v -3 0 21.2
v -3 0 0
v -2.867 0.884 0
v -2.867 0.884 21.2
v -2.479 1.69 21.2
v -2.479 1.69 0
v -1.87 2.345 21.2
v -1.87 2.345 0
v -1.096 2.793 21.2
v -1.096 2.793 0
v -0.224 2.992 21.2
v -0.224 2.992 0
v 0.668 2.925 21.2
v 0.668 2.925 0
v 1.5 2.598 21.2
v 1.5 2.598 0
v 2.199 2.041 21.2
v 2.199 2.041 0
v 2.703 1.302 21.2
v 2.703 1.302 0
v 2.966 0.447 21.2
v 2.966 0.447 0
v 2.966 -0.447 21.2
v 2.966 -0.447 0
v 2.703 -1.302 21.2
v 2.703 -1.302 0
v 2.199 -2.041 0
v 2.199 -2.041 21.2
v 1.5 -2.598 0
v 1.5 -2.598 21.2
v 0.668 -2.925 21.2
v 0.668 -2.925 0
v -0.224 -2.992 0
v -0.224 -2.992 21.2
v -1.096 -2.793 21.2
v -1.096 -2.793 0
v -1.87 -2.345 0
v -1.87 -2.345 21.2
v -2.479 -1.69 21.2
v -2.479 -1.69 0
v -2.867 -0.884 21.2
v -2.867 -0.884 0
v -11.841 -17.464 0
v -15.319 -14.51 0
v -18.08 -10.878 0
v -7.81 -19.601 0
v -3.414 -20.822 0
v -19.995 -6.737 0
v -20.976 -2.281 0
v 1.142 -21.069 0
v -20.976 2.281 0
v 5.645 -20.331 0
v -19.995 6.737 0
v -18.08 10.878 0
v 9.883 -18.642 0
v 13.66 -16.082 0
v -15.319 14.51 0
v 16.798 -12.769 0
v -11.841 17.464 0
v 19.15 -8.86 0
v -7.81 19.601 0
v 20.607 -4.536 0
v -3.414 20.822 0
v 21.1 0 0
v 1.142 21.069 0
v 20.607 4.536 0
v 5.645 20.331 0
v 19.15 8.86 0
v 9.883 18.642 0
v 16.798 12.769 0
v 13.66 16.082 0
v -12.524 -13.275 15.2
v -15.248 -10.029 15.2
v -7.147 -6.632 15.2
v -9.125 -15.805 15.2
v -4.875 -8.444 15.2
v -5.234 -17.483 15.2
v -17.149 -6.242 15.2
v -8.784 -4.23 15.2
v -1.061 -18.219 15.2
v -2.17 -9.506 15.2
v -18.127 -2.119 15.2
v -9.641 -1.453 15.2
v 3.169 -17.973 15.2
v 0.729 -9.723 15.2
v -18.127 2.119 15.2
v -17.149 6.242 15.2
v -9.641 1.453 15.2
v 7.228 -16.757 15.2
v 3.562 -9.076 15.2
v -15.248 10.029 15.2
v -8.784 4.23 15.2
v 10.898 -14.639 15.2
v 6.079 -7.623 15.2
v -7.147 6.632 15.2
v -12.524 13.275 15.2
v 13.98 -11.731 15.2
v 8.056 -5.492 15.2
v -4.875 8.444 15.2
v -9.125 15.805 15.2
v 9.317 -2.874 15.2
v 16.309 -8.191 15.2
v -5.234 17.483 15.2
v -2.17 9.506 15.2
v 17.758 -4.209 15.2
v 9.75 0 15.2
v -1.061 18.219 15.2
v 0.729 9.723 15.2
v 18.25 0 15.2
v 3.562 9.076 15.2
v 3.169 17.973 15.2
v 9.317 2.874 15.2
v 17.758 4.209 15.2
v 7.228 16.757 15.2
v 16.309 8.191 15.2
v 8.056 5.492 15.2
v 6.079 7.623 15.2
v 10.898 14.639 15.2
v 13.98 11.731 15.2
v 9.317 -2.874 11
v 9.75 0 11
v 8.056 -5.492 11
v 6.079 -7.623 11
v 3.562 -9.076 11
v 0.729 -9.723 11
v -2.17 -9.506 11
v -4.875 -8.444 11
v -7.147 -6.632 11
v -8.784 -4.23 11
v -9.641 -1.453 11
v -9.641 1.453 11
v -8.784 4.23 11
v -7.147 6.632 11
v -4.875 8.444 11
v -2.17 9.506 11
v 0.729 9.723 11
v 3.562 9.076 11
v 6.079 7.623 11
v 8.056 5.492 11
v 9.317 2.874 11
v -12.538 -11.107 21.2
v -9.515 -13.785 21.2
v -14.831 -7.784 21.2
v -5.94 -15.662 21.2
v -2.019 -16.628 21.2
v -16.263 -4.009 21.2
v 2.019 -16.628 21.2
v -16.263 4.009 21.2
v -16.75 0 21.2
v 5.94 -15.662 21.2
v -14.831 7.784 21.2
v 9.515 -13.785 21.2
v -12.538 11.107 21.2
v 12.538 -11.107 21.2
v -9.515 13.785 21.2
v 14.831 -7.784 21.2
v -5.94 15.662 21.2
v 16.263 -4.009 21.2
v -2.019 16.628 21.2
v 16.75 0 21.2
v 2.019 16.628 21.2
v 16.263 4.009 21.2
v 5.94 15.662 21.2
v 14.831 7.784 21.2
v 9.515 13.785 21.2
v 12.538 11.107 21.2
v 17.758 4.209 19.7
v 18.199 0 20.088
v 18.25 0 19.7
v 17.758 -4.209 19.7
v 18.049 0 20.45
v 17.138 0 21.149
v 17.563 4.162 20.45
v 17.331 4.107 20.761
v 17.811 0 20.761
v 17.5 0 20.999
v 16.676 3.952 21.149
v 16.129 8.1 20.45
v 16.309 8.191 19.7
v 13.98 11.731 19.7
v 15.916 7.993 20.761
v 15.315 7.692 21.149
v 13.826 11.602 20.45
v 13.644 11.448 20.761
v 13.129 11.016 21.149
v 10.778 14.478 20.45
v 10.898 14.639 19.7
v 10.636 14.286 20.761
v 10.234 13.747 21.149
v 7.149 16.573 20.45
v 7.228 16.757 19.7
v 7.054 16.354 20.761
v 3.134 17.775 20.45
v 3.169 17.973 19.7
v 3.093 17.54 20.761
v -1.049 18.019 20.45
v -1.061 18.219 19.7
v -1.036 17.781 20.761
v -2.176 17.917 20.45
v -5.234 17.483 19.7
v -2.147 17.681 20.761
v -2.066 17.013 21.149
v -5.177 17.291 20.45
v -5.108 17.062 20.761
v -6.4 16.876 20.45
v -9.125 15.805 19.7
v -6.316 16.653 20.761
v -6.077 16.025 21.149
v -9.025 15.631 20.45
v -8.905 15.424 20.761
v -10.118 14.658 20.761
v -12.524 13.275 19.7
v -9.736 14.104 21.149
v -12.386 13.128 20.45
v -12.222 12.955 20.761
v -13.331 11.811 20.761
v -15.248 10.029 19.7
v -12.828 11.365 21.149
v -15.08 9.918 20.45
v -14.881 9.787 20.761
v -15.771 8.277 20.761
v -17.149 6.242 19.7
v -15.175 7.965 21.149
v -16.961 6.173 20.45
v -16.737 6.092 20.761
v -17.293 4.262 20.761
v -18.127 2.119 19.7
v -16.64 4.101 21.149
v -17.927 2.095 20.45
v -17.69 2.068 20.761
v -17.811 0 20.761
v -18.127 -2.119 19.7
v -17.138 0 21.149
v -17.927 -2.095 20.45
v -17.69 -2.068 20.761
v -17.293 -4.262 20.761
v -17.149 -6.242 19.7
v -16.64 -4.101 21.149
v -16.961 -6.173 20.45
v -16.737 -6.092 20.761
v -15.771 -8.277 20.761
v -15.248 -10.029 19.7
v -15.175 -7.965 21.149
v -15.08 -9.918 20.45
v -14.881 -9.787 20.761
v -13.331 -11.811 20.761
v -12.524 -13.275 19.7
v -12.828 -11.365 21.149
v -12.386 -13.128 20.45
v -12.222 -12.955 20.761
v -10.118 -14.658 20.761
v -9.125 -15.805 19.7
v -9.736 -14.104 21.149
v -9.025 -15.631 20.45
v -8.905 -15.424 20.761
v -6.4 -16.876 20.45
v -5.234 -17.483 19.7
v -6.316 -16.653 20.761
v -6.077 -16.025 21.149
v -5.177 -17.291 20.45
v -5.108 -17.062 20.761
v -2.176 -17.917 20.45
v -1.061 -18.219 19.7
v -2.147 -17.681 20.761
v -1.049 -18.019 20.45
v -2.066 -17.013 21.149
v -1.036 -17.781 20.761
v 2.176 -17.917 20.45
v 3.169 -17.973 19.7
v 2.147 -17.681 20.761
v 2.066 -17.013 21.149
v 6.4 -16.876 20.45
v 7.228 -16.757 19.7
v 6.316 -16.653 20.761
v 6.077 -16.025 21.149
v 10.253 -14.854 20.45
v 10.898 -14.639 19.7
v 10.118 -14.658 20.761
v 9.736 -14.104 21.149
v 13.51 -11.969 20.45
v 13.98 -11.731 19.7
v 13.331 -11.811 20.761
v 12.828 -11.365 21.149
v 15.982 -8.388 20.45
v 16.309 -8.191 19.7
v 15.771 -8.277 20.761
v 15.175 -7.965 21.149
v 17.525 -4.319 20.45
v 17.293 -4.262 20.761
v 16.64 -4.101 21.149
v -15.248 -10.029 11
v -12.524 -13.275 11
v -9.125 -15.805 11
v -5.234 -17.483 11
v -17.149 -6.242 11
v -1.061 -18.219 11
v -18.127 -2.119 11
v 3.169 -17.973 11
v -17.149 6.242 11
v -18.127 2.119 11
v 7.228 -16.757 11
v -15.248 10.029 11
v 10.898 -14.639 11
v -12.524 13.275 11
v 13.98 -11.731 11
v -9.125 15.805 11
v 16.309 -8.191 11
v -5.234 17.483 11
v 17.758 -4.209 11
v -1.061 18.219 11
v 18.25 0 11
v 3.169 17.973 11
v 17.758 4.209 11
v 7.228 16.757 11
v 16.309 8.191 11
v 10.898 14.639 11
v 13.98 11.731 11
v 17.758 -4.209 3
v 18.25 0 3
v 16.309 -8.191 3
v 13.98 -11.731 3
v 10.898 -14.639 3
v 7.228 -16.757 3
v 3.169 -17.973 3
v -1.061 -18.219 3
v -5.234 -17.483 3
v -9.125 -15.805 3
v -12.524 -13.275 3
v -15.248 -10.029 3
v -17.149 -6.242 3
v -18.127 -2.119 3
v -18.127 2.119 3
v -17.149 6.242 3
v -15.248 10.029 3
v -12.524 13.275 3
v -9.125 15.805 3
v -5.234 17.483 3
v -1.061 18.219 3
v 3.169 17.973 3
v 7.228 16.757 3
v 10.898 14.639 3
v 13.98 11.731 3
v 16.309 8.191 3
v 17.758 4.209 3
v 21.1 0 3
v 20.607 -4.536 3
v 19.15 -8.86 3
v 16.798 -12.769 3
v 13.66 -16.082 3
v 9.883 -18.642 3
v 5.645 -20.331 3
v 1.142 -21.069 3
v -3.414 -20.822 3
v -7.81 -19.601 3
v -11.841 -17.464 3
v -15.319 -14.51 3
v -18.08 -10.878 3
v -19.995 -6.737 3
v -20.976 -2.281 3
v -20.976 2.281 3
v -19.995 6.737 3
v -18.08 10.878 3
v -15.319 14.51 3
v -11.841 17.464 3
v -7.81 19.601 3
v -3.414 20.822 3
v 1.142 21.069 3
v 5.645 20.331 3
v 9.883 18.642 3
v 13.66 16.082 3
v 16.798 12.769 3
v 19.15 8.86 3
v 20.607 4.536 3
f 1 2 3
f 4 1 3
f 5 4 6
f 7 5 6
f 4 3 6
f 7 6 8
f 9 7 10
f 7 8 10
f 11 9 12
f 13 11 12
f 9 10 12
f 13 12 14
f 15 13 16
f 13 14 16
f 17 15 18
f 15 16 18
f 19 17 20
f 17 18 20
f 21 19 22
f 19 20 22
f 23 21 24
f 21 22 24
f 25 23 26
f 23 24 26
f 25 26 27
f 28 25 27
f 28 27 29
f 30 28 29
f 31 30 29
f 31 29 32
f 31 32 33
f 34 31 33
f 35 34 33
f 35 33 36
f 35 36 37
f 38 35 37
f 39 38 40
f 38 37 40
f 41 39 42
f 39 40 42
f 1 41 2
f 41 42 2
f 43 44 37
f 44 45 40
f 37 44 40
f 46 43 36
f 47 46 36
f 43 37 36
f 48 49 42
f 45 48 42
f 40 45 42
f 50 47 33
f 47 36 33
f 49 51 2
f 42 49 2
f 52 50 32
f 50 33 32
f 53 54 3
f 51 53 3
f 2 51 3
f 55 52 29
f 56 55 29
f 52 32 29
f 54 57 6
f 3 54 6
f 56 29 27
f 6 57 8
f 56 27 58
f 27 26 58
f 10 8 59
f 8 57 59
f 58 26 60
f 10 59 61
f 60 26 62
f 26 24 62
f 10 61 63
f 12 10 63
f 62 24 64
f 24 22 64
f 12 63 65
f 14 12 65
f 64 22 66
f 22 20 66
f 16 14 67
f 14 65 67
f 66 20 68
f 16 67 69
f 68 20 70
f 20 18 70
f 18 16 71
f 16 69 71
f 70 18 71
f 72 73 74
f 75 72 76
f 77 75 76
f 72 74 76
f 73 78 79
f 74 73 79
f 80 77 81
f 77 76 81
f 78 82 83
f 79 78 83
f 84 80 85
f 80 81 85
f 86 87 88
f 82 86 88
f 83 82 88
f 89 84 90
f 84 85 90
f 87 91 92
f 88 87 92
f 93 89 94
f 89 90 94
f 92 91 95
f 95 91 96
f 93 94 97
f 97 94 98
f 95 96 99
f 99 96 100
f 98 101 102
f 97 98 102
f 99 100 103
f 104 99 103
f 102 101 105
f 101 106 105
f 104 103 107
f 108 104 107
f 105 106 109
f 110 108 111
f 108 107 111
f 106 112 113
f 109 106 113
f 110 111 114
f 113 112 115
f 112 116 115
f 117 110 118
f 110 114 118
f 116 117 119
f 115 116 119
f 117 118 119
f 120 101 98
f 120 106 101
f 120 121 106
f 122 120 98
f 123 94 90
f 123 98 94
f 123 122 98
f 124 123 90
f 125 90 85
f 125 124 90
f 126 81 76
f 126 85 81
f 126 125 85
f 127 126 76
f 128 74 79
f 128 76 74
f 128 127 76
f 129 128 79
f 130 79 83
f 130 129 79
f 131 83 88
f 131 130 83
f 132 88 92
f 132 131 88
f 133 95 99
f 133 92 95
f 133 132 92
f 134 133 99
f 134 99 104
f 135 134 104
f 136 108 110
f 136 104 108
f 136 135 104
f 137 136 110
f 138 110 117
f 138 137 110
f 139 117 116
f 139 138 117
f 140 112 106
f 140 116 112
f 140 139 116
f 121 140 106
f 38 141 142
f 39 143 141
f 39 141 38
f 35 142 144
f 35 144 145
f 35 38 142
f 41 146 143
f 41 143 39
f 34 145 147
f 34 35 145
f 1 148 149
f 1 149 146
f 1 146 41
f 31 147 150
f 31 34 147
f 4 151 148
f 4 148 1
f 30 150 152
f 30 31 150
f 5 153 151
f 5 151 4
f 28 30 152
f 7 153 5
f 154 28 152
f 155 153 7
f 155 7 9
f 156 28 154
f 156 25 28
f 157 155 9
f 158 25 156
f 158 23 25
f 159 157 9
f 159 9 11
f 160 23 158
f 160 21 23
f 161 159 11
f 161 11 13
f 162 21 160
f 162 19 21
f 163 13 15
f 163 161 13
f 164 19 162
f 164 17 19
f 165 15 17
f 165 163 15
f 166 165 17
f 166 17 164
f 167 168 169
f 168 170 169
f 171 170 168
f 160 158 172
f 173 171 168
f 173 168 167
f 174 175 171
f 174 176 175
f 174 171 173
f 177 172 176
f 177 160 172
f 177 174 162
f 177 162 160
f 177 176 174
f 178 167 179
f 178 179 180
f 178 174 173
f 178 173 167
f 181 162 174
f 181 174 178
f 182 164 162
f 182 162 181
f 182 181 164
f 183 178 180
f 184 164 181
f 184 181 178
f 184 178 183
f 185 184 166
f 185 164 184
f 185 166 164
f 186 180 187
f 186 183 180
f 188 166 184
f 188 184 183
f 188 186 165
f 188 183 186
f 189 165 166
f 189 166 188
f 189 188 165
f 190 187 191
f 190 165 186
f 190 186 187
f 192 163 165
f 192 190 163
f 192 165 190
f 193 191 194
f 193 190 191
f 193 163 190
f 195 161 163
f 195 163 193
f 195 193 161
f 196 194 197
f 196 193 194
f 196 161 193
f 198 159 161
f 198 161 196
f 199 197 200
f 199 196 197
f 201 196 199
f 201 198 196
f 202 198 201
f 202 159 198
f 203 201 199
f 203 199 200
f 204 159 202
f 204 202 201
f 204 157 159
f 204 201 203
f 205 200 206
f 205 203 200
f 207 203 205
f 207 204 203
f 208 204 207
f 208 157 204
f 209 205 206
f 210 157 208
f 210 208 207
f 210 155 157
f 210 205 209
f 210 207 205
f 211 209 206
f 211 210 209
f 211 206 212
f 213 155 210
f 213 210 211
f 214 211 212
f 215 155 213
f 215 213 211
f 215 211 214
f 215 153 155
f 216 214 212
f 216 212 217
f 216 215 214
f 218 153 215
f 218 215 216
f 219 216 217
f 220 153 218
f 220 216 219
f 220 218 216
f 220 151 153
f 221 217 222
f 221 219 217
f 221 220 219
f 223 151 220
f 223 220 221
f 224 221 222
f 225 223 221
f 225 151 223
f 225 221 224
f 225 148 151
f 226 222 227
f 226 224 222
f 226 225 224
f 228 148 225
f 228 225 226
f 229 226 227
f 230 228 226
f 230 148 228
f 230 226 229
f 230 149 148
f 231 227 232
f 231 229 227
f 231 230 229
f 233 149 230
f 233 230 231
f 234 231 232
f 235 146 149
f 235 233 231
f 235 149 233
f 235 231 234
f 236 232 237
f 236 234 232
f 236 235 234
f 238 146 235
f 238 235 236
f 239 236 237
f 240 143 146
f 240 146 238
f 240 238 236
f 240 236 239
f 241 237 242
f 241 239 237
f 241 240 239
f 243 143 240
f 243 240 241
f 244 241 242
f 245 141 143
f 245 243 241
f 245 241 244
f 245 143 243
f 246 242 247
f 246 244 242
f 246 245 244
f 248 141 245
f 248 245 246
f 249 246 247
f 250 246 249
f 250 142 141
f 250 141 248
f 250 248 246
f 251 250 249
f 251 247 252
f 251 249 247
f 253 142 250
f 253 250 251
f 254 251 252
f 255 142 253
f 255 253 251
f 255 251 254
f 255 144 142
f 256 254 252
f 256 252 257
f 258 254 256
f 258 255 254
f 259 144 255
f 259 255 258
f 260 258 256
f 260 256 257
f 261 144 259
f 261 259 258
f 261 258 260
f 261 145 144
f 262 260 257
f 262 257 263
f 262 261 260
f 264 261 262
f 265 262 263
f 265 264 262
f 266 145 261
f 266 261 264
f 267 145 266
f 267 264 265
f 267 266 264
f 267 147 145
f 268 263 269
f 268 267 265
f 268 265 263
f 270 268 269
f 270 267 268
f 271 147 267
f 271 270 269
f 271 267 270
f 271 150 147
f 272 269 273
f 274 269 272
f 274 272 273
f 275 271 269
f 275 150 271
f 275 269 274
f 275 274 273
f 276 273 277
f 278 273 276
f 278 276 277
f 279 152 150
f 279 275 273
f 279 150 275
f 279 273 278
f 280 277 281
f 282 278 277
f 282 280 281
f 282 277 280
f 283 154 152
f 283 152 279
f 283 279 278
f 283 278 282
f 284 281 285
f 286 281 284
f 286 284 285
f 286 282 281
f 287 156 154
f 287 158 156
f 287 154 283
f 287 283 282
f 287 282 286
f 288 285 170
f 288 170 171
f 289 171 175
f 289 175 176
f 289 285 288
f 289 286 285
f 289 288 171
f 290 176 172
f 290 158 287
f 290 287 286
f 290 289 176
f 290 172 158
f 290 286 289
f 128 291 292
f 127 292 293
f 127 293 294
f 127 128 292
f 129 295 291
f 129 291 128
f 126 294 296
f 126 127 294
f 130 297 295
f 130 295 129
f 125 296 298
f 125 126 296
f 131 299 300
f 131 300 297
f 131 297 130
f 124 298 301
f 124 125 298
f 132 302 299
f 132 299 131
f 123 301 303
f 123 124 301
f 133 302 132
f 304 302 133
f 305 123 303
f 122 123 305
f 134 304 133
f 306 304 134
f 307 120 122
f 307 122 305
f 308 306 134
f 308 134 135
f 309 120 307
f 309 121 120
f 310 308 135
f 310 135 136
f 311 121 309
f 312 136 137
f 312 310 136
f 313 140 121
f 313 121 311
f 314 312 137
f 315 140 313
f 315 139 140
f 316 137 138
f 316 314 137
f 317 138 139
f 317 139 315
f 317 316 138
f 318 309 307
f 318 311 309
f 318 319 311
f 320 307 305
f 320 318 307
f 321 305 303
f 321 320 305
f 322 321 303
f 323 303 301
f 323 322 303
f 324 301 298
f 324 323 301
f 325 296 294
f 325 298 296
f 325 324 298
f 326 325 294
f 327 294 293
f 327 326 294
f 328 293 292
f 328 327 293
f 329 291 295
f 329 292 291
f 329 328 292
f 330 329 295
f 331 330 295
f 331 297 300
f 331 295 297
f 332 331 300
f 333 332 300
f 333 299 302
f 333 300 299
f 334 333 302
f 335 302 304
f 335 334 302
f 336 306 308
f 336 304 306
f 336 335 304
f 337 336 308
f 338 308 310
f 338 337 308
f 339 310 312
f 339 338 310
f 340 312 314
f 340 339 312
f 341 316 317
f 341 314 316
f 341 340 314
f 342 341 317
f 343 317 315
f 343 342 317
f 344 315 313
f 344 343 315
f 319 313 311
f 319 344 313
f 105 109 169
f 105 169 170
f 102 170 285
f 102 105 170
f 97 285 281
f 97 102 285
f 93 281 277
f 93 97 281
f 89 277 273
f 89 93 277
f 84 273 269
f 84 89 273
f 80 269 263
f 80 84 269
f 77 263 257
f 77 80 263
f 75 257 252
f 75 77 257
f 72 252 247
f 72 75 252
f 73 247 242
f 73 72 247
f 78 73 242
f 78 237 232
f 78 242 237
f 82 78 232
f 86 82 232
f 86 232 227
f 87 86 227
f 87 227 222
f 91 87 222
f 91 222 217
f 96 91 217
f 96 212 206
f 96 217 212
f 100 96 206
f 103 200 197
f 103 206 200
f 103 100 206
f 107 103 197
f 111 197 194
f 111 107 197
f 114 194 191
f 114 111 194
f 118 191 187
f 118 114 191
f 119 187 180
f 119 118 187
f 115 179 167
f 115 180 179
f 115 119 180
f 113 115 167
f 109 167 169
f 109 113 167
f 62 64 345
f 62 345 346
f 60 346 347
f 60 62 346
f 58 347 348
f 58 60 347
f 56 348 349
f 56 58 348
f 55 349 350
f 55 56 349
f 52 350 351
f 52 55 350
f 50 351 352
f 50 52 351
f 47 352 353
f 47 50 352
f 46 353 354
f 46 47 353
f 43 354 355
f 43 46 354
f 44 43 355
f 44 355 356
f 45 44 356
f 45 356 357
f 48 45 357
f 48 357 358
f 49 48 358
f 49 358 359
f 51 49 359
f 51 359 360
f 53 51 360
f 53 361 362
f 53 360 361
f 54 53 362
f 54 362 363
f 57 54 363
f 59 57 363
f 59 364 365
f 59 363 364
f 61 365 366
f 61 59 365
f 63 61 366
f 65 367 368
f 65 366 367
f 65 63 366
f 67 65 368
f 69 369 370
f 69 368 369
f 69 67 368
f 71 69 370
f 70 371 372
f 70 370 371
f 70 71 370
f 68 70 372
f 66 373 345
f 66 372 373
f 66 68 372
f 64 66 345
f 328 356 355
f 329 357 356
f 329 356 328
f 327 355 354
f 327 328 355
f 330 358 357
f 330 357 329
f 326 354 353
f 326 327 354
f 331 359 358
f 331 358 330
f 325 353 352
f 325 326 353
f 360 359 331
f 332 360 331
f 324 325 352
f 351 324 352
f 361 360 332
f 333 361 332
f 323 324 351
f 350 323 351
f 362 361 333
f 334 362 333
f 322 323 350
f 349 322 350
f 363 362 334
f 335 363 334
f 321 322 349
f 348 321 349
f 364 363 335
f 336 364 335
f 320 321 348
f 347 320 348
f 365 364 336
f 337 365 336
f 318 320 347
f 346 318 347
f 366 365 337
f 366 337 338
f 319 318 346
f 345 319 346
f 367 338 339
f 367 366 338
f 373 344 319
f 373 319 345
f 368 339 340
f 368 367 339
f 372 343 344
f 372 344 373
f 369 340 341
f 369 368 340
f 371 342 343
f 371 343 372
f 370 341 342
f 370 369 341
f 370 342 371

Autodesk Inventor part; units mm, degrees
ref_plane "YZ Plane" through (0, 0, 0) normal (1, 0, 0) x (0, 1, 0)
ref_plane "XZ Plane" through (0, 0, 0) normal (0, 1, 0) x (-1, 0, 0)
ref_plane "XY Plane" through (0, 0, 0) normal (0, 0, 1) x (1, 0, 0)
sketch "Skizze1" plane through (0, 0, 0) normal (0, 0, 1) x (1, 0, 0)
  circle A0 centre (0, 0) radius 21.1
  dimension "d0" = 42.2
extrude "Extrusion1" add sketch "Skizze1" along normal blind 3
sketch "Skizze2" plane through (0, 0, 3) normal (0, 0, 1) x (1, 0, 0)
  circle A0 centre (0, 0) radius 18.25
  dimension "d3" = 36.5
extrude "Extrusion2" add sketch "Skizze2" along normal blind 8
sketch "Skizze3" plane through (0, 0, 11) normal (0, 0, 1) x (1, 0, 0)
  circle A0 centre (0, 0) radius 9.75
  dimension "d6" = 19.5
extrude "Extrusion3" add sketch "Skizze3" along normal blind 4.2
sketch "Skizze4" plane through (0, 0, 15.2) normal (0, 0, 1) x (1, 0, 0)
  circle A0 centre (0, 0) radius 18.25
  dimension "d12" = 36.5
extrude "Extrusion4" add sketch "Skizze4" along normal blind 6
fillet "Rundung1" radius 1.5 1 edges at (-18.25, 0, 21.2)
sketch "Skizze5" plane through (0, 0, 0) normal (0, 0, -1) x (-1, 0, 0)
  circle A0 centre (0, 0) radius 3
  dimension "d13" = 6
extrude "Extrusion5" cut sketch "Skizze5" against normal blind 100
properties part number "Pfropfen_mittel"
